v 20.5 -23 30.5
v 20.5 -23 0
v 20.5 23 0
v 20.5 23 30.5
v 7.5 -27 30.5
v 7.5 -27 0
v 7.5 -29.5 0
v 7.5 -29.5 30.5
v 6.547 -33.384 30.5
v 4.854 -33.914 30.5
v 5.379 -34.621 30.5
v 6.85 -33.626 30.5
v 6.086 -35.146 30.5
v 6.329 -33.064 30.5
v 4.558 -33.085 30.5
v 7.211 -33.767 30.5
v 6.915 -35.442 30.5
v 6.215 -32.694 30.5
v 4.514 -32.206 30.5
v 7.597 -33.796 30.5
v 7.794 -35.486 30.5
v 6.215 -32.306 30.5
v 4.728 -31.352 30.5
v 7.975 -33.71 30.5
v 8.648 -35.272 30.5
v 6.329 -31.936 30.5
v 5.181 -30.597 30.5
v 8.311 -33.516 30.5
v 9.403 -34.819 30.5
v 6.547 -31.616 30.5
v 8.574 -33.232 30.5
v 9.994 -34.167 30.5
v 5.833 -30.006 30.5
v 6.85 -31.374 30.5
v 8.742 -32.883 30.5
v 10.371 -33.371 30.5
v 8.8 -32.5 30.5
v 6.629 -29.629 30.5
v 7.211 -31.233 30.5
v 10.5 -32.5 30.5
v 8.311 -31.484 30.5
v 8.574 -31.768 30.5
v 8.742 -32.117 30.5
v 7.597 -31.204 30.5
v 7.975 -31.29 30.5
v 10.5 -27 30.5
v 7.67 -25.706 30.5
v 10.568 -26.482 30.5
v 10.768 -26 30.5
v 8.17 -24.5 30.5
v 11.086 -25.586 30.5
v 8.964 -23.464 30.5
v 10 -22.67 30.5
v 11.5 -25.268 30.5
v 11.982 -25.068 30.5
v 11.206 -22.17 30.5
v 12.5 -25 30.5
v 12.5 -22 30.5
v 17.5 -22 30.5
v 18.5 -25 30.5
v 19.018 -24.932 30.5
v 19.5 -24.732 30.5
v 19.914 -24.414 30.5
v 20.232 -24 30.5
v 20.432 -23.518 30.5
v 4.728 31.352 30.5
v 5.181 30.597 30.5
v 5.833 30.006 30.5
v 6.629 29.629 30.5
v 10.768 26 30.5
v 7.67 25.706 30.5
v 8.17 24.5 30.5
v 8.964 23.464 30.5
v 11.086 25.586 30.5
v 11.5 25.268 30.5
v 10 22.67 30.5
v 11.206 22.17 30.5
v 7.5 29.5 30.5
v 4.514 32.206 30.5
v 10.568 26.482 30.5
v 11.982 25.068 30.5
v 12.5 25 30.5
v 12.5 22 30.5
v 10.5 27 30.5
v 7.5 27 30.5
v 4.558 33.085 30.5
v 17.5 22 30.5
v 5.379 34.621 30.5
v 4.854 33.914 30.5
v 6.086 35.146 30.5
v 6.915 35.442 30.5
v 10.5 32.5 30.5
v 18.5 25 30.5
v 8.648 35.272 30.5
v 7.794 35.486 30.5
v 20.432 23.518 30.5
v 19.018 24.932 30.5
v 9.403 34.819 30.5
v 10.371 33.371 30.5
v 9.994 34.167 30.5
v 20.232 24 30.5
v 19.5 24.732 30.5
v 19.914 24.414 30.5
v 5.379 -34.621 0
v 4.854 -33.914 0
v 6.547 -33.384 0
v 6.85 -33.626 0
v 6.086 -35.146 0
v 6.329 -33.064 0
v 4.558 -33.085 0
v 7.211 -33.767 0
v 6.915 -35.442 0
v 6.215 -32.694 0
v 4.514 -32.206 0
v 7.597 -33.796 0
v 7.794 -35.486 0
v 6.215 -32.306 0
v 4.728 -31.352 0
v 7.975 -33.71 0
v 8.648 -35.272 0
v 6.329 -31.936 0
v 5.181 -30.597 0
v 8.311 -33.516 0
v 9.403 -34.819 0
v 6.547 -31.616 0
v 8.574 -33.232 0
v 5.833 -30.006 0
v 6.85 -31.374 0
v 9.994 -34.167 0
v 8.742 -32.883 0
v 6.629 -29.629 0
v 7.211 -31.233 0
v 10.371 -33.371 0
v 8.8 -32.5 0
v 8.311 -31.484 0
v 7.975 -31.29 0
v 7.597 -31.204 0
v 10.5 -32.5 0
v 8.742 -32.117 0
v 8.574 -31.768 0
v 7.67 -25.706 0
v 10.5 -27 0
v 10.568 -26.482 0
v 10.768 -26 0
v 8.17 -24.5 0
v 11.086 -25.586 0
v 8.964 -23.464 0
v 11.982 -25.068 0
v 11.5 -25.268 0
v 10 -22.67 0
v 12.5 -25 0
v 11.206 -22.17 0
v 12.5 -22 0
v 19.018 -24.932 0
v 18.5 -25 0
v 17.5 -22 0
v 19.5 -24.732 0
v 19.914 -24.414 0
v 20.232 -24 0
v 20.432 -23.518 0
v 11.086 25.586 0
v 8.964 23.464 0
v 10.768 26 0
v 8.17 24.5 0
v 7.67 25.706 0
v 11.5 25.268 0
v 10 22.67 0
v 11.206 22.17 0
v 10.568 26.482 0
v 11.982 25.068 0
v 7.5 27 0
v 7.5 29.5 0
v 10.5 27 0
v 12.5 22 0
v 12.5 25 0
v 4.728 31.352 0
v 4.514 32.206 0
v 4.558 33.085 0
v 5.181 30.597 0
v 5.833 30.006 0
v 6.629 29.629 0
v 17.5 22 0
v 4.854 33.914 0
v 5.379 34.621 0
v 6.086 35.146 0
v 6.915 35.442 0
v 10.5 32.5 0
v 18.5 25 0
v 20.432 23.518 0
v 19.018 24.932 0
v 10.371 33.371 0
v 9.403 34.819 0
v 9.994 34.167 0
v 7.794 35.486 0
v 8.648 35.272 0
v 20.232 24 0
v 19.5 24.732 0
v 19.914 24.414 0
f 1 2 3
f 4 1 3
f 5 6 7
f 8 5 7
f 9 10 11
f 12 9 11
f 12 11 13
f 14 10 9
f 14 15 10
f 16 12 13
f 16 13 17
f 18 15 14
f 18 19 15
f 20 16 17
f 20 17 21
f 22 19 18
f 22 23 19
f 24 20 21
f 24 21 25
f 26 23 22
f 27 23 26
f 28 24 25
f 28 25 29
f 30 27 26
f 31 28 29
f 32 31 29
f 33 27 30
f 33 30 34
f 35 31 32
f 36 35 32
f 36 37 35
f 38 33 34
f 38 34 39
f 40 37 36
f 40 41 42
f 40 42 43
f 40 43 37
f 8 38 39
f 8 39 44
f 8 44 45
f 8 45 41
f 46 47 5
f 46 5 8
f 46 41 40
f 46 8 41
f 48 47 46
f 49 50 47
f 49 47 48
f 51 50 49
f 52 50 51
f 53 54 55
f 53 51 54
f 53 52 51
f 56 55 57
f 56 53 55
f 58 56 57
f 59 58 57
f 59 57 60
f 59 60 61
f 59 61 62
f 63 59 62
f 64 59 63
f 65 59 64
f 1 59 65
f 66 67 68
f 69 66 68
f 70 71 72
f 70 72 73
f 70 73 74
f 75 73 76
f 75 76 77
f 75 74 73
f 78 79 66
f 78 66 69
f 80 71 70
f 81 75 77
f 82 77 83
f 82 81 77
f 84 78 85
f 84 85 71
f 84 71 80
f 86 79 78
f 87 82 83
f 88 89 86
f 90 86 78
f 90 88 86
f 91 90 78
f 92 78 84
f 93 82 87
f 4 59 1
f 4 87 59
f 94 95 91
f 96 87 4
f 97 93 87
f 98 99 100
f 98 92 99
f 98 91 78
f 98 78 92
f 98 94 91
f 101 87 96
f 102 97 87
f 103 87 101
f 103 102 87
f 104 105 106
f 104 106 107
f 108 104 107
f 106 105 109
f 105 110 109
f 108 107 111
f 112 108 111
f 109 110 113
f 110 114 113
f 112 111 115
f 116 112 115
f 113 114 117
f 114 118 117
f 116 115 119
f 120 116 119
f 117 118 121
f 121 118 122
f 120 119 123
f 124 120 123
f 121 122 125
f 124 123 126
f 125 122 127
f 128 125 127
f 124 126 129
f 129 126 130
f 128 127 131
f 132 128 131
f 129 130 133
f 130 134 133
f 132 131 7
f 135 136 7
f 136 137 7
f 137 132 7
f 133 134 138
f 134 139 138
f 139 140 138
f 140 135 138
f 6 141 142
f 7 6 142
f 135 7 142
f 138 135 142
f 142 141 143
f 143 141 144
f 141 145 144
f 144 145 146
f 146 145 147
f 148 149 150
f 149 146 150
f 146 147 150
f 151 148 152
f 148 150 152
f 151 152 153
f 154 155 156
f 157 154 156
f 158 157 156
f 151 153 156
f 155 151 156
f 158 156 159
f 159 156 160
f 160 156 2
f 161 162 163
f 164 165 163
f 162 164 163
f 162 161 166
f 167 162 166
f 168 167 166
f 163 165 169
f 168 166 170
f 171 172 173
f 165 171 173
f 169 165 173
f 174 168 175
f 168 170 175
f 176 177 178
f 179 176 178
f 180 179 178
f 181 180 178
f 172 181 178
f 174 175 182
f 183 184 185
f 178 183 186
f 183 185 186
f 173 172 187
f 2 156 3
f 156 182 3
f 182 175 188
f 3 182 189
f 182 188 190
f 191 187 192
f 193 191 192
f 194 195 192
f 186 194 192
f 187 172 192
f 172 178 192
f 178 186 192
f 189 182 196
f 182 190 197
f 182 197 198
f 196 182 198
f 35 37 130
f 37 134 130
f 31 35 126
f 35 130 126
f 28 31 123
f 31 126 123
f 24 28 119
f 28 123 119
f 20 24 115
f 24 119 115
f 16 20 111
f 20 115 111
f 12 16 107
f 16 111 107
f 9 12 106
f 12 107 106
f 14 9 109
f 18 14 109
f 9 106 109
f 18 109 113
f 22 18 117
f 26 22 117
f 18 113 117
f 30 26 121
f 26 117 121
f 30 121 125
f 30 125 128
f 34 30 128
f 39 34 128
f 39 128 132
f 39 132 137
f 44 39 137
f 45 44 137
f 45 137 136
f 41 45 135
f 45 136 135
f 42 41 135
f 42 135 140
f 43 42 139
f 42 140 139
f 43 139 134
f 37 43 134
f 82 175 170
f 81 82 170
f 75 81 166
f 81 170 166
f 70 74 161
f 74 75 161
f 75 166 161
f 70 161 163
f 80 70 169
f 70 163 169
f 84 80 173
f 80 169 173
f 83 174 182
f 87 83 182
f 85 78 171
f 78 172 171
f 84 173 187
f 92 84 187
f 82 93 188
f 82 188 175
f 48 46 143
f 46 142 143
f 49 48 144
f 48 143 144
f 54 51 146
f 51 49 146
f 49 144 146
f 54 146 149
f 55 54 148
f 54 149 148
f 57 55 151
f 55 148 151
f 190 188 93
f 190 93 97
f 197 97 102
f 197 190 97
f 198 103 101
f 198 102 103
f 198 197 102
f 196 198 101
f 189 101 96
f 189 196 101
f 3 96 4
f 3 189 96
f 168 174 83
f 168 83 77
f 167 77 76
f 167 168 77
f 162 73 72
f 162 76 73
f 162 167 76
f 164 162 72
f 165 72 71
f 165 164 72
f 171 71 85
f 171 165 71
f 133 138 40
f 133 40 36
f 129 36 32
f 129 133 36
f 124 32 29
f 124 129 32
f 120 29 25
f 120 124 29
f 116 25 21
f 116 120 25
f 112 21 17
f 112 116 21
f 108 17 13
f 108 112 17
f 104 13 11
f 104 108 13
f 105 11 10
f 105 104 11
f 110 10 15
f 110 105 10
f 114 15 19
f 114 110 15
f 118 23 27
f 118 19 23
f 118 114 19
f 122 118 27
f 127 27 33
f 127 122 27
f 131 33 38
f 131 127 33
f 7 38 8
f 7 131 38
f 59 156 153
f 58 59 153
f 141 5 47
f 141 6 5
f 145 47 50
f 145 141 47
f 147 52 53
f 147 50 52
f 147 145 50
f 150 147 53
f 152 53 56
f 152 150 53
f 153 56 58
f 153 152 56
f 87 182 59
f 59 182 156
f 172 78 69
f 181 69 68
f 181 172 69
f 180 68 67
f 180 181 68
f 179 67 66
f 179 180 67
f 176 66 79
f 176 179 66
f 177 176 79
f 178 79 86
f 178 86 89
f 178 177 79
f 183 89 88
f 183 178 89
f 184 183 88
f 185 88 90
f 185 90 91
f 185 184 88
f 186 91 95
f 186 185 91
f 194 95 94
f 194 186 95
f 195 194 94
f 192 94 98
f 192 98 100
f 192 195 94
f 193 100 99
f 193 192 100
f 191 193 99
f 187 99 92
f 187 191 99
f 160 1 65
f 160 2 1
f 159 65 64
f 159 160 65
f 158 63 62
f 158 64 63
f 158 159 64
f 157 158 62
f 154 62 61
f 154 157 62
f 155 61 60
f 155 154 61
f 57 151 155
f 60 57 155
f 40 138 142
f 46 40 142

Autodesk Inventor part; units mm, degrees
ref_plane "YZ Plane" through (0, 0, 0) normal (1, 0, 0) x (0, 1, 0)
ref_plane "XZ Plane" through (0, 0, 0) normal (0, 1, 0) x (-1, 0, 0)
sketch "スケッチ1" plane through (0, 0, 0) normal (0, 0, 1) x (1, 0, 0)
  circle A0 centre (-7.5, 32.5) radius 1.6 projected
  circle A1 centre (7.5, -32.5) radius 1.6 projected
  circle A2 centre (7.5, 32.5) radius 1.6 projected
  circle A3 centre (-7.5, -32.5) radius 1.6 projected
  circle A4 centre (15.5, 0) radius 1.1 projected
  circle A5 centre (10.5, -5) radius 1.1 projected
  circle A6 centre (5.5, 0) radius 1.1 projected
  circle A7 centre (10.5, 5) radius 1.1 projected
  arc A8 (-10.5, -38) -> (-8.5, -40) centre (-8.5, -38) ccw projected
  line L0 (-8.5, -40) -> (8.5, -40) projected
  arc A9 (8.5, -40) -> (10.5, -38) centre (8.5, -38) ccw projected
  line L1 (10.5, -38) -> (10.5, -27) projected
  arc A10 (12.5, -25) -> (10.5, -27) centre (12.5, -27) ccw projected
  line L2 (12.5, -25) -> (18.5, -25) projected
  arc A11 (18.5, -25) -> (20.5, -23) centre (18.5, -23) ccw projected
  line L3 (20.5, -23) -> (20.5, 23) projected
  arc A12 (20.5, 23) -> (18.5, 25) centre (18.5, 23) ccw projected
  line L4 (18.5, 25) -> (12.5, 25) projected
  arc A13 (10.5, 27) -> (12.5, 25) centre (12.5, 27) ccw projected
  line L5 (10.5, 27) -> (10.5, 38) projected
  arc A14 (10.5, 38) -> (8.5, 40) centre (8.5, 38) ccw projected
  line L6 (8.5, 40) -> (-8.5, 40) projected
  arc A15 (-8.5, 40) -> (-10.5, 38) centre (-8.5, 38) ccw projected
  line L7 (-10.5, 38) -> (-10.5, 27) projected
  arc A16 (-12.5, 25) -> (-10.5, 27) centre (-12.5, 27) ccw projected
  line L8 (-12.5, 25) -> (-27.5, 25) projected
  arc A17 (-27.5, 25) -> (-29.5, 23) centre (-27.5, 23) ccw projected
  line L9 (-29.5, 23) -> (-29.5, -23) projected
  arc A18 (-29.5, -23) -> (-27.5, -25) centre (-27.5, -23) ccw projected
  line L10 (-27.5, -25) -> (-12.5, -25) projected
  arc A19 (-10.5, -27) -> (-12.5, -25) centre (-12.5, -27) ccw projected
  line L11 (-10.5, -27) -> (-10.5, -38) projected
  circle A20 centre (-8, 38) radius 1.1 projected
  circle A21 centre (-8, -38) radius 1.1 projected
  circle A22 centre (8, -38) radius 1.1 projected
  circle A23 centre (8, 38) radius 1.1 projected
  circle A24 centre (7.5, -32.5) radius 3
  circle A25 centre (7.5, 32.5) radius 3
  line L12 (12.5, 22) -> (17.5, 22)
  line L13 (17.5, 22) -> (17.5, -22)
  line L14 (17.5, -22) -> (12.5, -22)
  arc A26 (12.5, -22) -> (7.5, -27) centre (12.5, -27) ccw
  line L15 (7.5, -27) -> (7.5, -37)
  line L16 (7.5, -37) -> (-7.5, -37)
  line L17 (-7.5, -37) -> (-7.5, -27)
  arc A27 (-7.5, -27) -> (-12.5, -22) centre (-12.5, -27) ccw
  line L18 (-12.5, -22) -> (-26.5, -22)
  line L19 (-26.5, -22) -> (-26.5, 22)
  line L20 (-26.5, 22) -> (-12.5, 22)
  arc A28 (-12.5, 22) -> (-7.5, 27) centre (-12.5, 27) ccw
  line L21 (-7.5, 27) -> (-7.5, 37)
  line L22 (-7.5, 37) -> (7.5, 37)
  line L23 (7.5, 37) -> (7.5, 27)
  arc A29 (7.5, 27) -> (12.5, 22) centre (12.5, 27) ccw
  circle A30 centre (7.5, -32.5) radius 1.3
  circle A31 centre (7.5, 32.5) radius 1.3
  point P0 (0, 0)
  point P1 (7.5, -29.5)
  point P2 (10.5, -32.5)
  point P3 (10.5, 32.5)
  point P4 (7.5, 29.5)
  point P5 (17.5, 0.4583)
  point P6 (17.5, -0.4583)
  point P7 (7.5, -33.8)
  point P8 (7.5, -31.2)
  point P9 (7.5, -30.9)
  point P10 (7.5, -34.1)
  point P11 (7.5, 35.5)
  point P12 (7.5, -35.5)
  dimension "d0" = 6
  dimension "d1" = 6
  dimension "d2" = 3
  dimension "d5" = 2.6
  dimension "d6" = 2.6
ref_plane "作業平面1" through (-29.5, -40, 30.5) normal (0, 0, -1) x (0, 1, 0)
extrude "押し出し1" add sketch "スケッチ1" along normal up to surface (30.5 mm away) contours L23 A2 A25 | A25 L23 A2 | L5 A13 L4 A12 L3 A11 L2 A10 L1 A24 L15 A26 L14 L13 L12 A29 L23 A25 | L23 A31 A2 | A2 L23 A31 | A31 L23 | L23 A31 | L15 A1 A24 | A24 L15 A1 | L15 A30 A1 | A1 L15 A30
properties part number "mune_1" material "ABS プラスチック"
